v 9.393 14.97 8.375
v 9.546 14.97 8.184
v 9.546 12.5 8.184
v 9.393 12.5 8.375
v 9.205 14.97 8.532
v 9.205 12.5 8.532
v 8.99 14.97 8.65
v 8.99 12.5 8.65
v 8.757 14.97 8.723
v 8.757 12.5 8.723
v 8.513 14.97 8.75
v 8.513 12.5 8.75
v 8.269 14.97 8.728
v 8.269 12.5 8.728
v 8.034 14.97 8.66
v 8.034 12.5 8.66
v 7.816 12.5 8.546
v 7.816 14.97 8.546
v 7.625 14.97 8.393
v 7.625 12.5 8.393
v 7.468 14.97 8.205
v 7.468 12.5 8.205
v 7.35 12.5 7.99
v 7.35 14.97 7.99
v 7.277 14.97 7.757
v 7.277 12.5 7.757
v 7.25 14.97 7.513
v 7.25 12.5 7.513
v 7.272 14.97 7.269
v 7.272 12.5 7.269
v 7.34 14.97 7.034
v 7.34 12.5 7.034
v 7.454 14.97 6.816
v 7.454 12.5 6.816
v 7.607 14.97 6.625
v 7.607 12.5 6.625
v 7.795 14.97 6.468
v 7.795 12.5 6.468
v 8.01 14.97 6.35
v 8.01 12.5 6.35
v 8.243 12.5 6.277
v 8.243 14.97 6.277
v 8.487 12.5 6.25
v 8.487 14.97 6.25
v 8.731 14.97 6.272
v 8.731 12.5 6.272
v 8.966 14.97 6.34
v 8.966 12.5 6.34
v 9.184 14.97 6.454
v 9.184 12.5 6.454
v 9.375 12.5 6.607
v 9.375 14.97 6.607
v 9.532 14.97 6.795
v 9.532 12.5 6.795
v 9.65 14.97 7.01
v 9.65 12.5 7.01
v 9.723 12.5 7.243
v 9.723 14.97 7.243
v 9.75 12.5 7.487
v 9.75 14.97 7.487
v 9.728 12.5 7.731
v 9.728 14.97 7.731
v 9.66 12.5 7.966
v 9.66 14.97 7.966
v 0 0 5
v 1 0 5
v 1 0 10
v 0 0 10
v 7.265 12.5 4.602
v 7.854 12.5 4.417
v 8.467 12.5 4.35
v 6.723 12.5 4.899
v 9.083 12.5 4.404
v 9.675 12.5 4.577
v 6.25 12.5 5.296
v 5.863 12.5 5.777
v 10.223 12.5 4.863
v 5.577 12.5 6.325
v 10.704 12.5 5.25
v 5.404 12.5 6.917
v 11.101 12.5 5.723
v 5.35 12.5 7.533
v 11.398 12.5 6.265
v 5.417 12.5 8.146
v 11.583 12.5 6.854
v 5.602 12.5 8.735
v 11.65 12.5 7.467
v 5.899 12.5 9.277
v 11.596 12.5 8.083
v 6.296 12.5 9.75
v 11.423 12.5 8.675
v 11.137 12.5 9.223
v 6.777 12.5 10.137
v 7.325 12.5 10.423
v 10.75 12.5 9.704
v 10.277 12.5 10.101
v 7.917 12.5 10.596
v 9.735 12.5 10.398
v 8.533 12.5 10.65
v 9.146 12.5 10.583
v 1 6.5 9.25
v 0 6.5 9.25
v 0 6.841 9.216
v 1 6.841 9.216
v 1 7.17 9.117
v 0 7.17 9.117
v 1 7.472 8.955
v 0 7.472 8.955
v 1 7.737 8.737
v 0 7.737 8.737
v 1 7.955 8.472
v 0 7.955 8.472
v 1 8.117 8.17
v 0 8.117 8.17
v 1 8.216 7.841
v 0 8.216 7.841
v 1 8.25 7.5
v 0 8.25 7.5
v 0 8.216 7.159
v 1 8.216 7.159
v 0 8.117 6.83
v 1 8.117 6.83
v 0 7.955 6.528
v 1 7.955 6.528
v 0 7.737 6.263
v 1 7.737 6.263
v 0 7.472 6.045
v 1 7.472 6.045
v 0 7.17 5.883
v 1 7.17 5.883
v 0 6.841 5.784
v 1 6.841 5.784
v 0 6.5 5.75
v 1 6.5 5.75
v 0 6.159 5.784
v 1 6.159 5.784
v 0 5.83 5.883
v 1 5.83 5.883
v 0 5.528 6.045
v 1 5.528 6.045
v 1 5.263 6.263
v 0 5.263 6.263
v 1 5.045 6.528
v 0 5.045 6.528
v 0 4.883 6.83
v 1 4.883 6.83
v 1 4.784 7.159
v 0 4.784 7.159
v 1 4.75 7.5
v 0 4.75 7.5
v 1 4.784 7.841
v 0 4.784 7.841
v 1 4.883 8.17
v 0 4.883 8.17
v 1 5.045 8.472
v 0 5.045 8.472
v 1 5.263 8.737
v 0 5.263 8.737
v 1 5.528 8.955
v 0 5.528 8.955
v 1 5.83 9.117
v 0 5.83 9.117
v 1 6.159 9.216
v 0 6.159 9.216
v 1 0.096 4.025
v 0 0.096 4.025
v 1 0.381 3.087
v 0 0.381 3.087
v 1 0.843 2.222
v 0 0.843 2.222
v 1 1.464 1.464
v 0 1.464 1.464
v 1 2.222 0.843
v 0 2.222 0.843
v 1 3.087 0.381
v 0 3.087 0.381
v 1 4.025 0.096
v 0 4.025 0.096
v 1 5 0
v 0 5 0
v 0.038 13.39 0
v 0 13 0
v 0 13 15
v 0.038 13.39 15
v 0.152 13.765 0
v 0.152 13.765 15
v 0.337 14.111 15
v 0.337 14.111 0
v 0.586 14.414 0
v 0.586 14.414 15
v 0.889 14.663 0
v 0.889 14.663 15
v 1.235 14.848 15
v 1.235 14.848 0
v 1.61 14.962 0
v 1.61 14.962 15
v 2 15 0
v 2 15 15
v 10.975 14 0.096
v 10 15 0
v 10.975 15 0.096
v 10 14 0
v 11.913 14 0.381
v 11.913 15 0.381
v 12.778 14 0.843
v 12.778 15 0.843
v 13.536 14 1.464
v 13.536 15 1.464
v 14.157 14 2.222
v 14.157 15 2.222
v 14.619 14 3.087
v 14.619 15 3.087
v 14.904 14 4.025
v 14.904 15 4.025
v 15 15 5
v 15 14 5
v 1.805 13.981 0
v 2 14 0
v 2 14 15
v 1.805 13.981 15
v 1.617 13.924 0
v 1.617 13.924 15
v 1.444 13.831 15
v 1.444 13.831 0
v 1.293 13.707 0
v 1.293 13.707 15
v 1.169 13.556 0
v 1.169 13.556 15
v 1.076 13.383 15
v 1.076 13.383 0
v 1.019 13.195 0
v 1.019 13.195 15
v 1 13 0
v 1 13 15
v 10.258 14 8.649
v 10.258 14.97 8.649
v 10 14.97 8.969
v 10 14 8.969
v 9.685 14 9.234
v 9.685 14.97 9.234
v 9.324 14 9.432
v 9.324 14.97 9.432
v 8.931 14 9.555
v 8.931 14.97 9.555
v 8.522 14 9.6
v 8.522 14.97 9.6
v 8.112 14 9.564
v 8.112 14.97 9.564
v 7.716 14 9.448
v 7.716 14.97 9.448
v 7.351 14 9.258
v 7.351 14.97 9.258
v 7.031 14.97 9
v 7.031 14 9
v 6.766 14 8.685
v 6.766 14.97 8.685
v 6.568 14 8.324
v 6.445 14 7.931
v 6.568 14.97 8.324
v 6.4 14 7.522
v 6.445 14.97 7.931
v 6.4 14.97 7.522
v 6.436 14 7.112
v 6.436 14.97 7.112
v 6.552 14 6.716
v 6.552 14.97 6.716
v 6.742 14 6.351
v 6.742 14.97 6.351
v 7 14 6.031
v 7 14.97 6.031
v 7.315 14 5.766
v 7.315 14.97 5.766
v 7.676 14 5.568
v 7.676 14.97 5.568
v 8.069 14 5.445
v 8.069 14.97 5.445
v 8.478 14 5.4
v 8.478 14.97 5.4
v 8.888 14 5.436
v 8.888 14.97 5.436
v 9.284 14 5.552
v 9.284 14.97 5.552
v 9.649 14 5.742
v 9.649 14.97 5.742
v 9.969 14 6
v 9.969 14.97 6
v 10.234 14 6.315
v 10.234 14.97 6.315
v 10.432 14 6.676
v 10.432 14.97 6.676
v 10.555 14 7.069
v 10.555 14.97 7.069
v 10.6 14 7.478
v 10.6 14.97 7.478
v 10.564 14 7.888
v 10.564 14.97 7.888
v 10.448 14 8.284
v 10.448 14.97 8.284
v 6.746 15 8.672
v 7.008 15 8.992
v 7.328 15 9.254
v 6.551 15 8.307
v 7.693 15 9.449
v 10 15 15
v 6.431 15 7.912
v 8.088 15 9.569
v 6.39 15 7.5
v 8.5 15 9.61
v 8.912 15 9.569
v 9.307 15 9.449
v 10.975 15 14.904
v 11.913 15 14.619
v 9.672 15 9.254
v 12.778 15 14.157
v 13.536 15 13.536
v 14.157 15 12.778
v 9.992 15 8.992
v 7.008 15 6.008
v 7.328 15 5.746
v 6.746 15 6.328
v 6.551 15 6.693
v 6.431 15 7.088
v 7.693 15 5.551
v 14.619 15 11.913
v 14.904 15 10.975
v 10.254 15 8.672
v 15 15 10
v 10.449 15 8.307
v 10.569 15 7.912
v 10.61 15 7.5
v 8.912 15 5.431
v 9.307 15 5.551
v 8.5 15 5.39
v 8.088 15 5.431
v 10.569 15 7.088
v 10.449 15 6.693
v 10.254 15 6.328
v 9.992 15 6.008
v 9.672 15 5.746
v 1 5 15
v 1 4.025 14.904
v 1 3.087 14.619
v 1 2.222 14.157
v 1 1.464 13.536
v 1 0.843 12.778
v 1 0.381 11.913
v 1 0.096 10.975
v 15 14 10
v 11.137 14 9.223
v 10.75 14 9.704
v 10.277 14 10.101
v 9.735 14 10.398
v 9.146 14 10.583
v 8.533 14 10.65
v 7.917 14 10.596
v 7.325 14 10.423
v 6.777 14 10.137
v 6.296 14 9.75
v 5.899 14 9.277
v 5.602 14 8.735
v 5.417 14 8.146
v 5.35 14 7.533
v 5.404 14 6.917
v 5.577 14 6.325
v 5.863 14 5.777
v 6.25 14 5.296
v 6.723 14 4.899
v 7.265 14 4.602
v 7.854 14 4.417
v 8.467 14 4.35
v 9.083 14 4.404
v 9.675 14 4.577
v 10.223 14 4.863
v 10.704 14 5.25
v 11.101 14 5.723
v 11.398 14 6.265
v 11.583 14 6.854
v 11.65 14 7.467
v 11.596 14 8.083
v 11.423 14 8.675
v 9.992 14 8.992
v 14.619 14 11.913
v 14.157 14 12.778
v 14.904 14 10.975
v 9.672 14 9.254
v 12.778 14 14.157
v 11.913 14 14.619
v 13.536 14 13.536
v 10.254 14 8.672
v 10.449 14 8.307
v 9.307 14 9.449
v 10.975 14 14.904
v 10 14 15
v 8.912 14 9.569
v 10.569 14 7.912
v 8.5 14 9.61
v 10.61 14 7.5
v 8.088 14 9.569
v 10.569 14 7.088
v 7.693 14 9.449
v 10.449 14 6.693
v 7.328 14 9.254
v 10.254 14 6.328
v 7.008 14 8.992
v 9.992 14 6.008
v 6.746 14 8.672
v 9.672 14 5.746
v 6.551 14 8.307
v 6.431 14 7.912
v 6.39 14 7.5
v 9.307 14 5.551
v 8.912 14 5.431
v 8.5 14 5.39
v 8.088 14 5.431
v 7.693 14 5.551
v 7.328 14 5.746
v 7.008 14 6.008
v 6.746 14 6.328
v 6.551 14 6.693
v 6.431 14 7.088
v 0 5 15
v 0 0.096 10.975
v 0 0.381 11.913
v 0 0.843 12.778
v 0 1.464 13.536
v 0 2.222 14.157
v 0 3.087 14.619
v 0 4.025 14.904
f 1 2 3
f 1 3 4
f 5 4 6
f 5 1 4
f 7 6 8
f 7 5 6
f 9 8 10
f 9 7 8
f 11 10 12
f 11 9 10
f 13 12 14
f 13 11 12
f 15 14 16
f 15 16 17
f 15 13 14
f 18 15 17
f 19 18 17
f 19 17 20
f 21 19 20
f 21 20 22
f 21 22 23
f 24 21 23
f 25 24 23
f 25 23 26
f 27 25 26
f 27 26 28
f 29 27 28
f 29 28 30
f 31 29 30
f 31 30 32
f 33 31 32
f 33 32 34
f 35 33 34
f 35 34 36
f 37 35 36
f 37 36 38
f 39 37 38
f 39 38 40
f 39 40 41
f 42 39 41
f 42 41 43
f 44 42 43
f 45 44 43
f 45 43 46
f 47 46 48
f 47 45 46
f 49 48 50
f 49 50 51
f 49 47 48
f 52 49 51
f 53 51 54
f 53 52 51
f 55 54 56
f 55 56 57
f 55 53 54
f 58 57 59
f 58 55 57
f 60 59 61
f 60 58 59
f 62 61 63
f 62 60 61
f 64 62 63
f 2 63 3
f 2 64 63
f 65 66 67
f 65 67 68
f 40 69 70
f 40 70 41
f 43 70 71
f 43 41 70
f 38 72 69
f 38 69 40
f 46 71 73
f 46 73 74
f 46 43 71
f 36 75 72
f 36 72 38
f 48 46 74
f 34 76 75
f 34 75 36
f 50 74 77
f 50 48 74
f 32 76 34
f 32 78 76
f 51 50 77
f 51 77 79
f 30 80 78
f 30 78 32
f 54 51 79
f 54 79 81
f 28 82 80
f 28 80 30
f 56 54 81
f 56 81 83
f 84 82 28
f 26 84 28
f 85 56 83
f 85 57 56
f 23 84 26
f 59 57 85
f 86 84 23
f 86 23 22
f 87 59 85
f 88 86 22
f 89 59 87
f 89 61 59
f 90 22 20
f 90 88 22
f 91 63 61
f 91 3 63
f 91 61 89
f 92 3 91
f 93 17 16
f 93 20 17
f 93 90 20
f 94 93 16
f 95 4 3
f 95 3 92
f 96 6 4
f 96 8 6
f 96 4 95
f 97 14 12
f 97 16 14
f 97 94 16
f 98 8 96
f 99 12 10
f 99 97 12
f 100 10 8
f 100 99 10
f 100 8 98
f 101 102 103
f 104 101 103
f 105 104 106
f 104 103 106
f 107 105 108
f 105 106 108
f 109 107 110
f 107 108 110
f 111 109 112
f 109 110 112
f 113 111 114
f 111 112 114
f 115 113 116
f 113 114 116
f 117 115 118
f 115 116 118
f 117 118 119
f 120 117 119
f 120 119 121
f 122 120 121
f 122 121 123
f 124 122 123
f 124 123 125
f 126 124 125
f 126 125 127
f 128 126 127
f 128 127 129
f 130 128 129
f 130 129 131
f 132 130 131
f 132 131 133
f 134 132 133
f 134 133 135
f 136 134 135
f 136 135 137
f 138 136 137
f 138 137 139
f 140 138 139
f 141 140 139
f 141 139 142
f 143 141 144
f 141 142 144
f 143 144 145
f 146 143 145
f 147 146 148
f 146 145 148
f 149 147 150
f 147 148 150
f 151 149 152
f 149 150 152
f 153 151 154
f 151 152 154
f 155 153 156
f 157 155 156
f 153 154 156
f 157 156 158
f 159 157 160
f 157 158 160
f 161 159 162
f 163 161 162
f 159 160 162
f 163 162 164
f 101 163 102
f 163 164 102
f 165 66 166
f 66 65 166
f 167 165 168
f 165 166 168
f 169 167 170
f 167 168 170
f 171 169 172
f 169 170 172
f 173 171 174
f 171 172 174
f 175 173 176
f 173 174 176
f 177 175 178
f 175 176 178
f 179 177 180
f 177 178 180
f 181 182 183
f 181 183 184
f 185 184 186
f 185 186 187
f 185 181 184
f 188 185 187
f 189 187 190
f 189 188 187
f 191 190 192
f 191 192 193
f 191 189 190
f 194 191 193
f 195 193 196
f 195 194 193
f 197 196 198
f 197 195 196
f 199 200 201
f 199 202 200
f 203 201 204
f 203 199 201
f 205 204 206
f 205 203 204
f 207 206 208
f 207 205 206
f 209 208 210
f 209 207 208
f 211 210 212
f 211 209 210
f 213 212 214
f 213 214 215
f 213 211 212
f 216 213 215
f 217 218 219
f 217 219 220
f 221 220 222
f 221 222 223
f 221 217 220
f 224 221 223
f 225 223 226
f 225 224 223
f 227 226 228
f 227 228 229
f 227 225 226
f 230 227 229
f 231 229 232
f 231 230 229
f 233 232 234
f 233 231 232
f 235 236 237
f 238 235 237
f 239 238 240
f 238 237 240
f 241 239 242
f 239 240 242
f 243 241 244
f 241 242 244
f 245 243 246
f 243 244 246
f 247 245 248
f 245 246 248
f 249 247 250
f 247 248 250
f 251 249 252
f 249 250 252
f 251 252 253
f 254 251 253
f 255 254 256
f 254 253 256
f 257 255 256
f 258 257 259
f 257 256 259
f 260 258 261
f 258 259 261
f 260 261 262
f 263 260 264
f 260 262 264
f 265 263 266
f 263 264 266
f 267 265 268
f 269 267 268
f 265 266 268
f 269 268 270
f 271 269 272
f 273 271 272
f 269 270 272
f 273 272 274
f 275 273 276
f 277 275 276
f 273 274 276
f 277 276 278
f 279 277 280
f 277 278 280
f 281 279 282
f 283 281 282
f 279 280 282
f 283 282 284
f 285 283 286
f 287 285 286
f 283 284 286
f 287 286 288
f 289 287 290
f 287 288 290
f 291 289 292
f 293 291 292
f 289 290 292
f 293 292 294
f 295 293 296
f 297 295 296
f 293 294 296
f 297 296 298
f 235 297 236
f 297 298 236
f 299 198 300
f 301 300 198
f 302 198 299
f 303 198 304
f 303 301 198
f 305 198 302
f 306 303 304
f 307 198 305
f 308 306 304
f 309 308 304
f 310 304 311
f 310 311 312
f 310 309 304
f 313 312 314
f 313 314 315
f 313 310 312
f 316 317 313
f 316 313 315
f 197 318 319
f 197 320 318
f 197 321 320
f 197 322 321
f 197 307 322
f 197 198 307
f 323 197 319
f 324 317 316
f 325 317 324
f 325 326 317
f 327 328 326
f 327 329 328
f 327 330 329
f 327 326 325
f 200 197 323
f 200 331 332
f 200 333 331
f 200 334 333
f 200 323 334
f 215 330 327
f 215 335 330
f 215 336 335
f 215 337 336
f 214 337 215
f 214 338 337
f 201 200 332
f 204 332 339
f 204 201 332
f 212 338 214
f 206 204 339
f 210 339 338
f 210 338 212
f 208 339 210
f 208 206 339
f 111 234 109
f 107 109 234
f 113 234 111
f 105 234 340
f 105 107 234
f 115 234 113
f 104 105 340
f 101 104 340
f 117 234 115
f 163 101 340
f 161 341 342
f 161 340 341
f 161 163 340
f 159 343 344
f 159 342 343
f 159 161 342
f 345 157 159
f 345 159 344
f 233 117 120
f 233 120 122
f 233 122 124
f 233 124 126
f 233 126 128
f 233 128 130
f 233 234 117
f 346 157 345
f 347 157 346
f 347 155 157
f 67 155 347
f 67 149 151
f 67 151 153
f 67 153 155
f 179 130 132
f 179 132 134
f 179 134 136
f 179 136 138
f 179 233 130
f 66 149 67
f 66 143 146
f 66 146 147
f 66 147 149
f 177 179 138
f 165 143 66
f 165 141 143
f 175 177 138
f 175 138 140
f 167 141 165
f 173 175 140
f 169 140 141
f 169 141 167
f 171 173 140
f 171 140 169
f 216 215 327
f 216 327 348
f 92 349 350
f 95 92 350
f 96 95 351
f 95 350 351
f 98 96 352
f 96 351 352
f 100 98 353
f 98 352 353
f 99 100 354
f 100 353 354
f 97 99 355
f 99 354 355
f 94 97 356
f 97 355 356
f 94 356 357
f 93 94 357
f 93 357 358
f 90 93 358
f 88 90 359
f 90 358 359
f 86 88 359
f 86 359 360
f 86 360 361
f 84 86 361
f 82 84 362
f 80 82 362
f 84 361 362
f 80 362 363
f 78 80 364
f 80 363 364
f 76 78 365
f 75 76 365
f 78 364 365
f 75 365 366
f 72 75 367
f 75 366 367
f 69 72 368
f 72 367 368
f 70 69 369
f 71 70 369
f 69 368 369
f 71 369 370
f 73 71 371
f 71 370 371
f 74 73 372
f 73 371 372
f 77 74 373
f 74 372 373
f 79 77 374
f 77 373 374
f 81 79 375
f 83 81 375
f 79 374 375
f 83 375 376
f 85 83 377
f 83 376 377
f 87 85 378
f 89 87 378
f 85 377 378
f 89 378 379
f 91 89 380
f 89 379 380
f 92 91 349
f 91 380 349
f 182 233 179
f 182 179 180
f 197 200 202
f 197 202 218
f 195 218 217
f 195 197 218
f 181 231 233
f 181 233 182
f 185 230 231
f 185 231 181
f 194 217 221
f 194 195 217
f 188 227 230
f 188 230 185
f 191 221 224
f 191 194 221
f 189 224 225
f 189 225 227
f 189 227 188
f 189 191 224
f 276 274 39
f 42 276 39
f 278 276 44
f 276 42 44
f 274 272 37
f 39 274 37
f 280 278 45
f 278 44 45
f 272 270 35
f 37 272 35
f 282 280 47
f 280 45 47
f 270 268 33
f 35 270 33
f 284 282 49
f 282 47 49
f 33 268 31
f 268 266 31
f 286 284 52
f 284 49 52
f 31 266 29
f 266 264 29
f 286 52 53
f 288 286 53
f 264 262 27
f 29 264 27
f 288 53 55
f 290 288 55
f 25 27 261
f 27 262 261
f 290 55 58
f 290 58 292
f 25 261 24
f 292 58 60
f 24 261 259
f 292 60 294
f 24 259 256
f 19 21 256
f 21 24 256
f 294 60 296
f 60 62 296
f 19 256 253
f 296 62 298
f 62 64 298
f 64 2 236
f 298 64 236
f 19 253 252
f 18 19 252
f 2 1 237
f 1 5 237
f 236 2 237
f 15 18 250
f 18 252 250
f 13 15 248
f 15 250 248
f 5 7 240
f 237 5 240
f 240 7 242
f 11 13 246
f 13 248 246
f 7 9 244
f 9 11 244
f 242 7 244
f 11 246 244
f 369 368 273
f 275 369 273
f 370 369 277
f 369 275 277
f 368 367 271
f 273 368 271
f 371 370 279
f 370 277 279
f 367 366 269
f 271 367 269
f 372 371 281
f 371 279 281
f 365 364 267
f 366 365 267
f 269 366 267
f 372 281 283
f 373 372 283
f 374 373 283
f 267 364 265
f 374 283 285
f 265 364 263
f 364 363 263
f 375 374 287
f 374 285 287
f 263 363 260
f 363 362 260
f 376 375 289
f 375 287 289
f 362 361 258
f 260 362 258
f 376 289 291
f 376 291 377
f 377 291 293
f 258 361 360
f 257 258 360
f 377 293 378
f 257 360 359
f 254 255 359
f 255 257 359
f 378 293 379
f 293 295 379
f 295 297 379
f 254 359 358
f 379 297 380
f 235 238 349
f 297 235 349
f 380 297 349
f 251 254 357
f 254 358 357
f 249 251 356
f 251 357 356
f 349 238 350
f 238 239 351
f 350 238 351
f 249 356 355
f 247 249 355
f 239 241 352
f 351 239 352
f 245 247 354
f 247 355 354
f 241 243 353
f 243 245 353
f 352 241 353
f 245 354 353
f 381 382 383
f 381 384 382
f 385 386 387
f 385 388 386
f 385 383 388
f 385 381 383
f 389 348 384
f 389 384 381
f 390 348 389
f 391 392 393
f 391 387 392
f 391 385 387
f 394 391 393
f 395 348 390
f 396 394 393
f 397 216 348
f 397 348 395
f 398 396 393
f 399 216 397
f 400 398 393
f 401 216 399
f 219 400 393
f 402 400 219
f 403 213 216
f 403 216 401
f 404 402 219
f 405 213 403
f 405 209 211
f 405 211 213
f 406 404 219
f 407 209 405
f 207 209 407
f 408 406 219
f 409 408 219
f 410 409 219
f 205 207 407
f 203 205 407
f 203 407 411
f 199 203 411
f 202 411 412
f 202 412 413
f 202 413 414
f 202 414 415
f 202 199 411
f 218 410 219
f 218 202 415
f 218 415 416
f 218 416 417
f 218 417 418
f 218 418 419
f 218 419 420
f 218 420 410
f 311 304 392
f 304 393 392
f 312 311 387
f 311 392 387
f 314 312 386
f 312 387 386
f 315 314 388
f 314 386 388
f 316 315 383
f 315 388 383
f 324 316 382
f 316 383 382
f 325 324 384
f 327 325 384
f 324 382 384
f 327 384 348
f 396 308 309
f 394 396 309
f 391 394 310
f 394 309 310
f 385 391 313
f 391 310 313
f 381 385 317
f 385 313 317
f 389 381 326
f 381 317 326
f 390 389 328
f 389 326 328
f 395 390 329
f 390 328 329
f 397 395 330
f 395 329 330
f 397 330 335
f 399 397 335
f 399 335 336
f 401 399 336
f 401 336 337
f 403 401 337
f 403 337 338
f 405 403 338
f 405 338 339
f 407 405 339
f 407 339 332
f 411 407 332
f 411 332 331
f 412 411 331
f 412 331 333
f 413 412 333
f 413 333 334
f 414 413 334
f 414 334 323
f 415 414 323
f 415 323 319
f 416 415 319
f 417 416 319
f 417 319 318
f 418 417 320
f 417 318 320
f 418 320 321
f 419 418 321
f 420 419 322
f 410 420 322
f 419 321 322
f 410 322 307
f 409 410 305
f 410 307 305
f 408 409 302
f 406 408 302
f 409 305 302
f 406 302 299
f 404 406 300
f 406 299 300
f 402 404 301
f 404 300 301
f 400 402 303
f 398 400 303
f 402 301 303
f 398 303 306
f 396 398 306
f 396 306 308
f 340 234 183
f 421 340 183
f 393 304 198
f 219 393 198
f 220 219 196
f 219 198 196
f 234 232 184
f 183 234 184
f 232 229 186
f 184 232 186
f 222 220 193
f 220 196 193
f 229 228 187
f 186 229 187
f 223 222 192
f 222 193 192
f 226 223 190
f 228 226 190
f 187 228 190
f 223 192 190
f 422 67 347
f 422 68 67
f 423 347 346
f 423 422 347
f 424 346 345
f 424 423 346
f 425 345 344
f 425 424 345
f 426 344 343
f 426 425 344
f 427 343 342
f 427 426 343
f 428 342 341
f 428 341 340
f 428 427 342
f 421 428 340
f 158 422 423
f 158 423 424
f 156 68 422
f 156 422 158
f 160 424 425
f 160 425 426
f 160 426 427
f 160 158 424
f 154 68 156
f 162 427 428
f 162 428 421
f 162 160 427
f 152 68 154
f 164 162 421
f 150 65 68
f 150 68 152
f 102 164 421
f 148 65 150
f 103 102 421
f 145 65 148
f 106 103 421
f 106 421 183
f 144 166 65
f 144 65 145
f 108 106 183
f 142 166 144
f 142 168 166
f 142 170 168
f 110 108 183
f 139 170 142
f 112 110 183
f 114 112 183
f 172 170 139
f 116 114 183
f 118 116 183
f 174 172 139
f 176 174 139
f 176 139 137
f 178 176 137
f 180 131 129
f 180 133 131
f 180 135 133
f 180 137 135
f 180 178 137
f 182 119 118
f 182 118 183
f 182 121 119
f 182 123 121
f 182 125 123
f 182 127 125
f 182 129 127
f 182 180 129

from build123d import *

# Parameters (mm, degrees)
BRIDA_BASE1_DEPTH          = 15
CORTAR_EXTRUIR1_REACH      = 27.981
CROQUIS2_R                 = 2.11
CORTAR_EXTRUIR2_REACH      = 27.981
CROQUIS3_R                 = 1.75
REDONDEO1_R                = 5
S_M3_1_START               = 6.057083137
S_M3_1_OUTLINE_R           = 3.15
S_M3_1_OUTLINE_R_2         = 1.25
S_M3_1_DEPTH               = 1.5
S_M3_1_START_2             = 5.087083137
S_M3_1_2_OUTLINE_R         = 2.1
S_M3_1_2_OUTLINE_R_2       = 1.25
S_M3_1_2_DEPTH             = 0.97
S_LIDO_MOVER_COPIAR2_ANGLE = 180


with BuildPart() as part:
    # Brida base1: sheet metal written as solids
    # Croquis1 → Brida base1 (new body)
    with BuildSketch(Plane.XY):
        with BuildLine():
            Line((0, 0), (0, 13))
            ThreePointArc((0, 13), (0.585786438, 14.414213562), (2, 15))
            Line((2, 15), (15, 15))
            Line((15, 15), (15, 14))
            Line((15, 14), (2, 14))
            ThreePointArc((2, 14), (1.292893219, 13.707106781), (1, 13))
            Line((1, 13), (1, 0))
            Line((1, 0), (0, 0))
        make_face()
    extrude(amount=BRIDA_BASE1_DEPTH)

    # Croquis2 → Cortar-Extruir1 (cut, up to next)
    with BuildSketch(Plane(origin=(0, 15, 0), x_dir=(1, 0, 0), z_dir=(0, 1, 0)), mode=Mode.PRIVATE) as cortar_extruir1_sk1:
        with Locations(Location((8.5, -7.5, 0), (0, 0, 270))):
            Circle(CROQUIS2_R)
    cortar_extruir1_tool1 = extrude(cortar_extruir1_sk1.sketch, amount=-CORTAR_EXTRUIR1_REACH, mode=Mode.PRIVATE) & part.part
    add(cortar_extruir1_tool1.solids().sort_by_distance((8.5, 15, 7.5))[0], mode=Mode.SUBTRACT)

    # Croquis3 → Cortar-Extruir2 (cut, up to next)
    with BuildSketch(Plane.ZY, mode=Mode.PRIVATE) as cortar_extruir2_sk1:
        with Locations((7.5, 6.5)):
            Circle(CROQUIS3_R)
    cortar_extruir2_tool1 = extrude(cortar_extruir2_sk1.sketch, amount=-CORTAR_EXTRUIR2_REACH, mode=Mode.PRIVATE) & part.part
    add(cortar_extruir2_tool1.solids().sort_by_distance((0, 6.5, 7.5))[0], mode=Mode.SUBTRACT)

    # Redondeo1
    redondeo1_edges = [part.edges().sort_by_distance(p)[0] for p in [
        (0.5, 0, 15),
        (15, 14.5, 15),
        (0.5, 0, 0),
        (15, 14.5, 0),
    ]]
    fillet(redondeo1_edges, radius=REDONDEO1_R)


with BuildPart() as body_2:
    # S-M3-1: read off the stored shape, not the designer's step
    # S-M3-1 outline → S-M3-1 (new body)
    with BuildSketch(Plane(origin=(0, 0, 0), x_dir=(1, 0, 0), z_dir=(0, 1, 0)).offset(S_M3_1_START)):
        with Locations((5.193353816, 2.598352405)):
            Circle(S_M3_1_OUTLINE_R)
        with Locations((5.193353816, 2.598352405)):
            Circle(S_M3_1_OUTLINE_R_2, mode=Mode.SUBTRACT)
    extrude(amount=S_M3_1_DEPTH)

    # S-M3-1 2 outline → S-M3-1 2 (add)
    with BuildSketch(Plane(origin=(0, 0, 0), x_dir=(1, 0, 0), z_dir=(0, 1, 0)).offset(S_M3_1_START_2)):
        with Locations((5.193353816, 2.598352405)):
            Circle(S_M3_1_2_OUTLINE_R)
        with Locations((5.193353816, 2.598352405)):
            Circle(S_M3_1_2_OUTLINE_R_2, mode=Mode.SUBTRACT)
    extrude(amount=S_M3_1_2_DEPTH)


with BuildPart() as body_2_1:
    # Sólido-Mover/Copiar2: read off the stored shape, not the designer's step
    # Sólido-Mover/Copiar2: moved
    add(body_2.part.moved(Location((6.0246646, -20.0570831, 0.9686093))).rotate(Axis((0, 0, 0), (0.9584281675, 0, 0.2853339234)), S_LIDO_MOVER_COPIAR2_ANGLE))


solid = Compound([part.part, body_2_1.part])
